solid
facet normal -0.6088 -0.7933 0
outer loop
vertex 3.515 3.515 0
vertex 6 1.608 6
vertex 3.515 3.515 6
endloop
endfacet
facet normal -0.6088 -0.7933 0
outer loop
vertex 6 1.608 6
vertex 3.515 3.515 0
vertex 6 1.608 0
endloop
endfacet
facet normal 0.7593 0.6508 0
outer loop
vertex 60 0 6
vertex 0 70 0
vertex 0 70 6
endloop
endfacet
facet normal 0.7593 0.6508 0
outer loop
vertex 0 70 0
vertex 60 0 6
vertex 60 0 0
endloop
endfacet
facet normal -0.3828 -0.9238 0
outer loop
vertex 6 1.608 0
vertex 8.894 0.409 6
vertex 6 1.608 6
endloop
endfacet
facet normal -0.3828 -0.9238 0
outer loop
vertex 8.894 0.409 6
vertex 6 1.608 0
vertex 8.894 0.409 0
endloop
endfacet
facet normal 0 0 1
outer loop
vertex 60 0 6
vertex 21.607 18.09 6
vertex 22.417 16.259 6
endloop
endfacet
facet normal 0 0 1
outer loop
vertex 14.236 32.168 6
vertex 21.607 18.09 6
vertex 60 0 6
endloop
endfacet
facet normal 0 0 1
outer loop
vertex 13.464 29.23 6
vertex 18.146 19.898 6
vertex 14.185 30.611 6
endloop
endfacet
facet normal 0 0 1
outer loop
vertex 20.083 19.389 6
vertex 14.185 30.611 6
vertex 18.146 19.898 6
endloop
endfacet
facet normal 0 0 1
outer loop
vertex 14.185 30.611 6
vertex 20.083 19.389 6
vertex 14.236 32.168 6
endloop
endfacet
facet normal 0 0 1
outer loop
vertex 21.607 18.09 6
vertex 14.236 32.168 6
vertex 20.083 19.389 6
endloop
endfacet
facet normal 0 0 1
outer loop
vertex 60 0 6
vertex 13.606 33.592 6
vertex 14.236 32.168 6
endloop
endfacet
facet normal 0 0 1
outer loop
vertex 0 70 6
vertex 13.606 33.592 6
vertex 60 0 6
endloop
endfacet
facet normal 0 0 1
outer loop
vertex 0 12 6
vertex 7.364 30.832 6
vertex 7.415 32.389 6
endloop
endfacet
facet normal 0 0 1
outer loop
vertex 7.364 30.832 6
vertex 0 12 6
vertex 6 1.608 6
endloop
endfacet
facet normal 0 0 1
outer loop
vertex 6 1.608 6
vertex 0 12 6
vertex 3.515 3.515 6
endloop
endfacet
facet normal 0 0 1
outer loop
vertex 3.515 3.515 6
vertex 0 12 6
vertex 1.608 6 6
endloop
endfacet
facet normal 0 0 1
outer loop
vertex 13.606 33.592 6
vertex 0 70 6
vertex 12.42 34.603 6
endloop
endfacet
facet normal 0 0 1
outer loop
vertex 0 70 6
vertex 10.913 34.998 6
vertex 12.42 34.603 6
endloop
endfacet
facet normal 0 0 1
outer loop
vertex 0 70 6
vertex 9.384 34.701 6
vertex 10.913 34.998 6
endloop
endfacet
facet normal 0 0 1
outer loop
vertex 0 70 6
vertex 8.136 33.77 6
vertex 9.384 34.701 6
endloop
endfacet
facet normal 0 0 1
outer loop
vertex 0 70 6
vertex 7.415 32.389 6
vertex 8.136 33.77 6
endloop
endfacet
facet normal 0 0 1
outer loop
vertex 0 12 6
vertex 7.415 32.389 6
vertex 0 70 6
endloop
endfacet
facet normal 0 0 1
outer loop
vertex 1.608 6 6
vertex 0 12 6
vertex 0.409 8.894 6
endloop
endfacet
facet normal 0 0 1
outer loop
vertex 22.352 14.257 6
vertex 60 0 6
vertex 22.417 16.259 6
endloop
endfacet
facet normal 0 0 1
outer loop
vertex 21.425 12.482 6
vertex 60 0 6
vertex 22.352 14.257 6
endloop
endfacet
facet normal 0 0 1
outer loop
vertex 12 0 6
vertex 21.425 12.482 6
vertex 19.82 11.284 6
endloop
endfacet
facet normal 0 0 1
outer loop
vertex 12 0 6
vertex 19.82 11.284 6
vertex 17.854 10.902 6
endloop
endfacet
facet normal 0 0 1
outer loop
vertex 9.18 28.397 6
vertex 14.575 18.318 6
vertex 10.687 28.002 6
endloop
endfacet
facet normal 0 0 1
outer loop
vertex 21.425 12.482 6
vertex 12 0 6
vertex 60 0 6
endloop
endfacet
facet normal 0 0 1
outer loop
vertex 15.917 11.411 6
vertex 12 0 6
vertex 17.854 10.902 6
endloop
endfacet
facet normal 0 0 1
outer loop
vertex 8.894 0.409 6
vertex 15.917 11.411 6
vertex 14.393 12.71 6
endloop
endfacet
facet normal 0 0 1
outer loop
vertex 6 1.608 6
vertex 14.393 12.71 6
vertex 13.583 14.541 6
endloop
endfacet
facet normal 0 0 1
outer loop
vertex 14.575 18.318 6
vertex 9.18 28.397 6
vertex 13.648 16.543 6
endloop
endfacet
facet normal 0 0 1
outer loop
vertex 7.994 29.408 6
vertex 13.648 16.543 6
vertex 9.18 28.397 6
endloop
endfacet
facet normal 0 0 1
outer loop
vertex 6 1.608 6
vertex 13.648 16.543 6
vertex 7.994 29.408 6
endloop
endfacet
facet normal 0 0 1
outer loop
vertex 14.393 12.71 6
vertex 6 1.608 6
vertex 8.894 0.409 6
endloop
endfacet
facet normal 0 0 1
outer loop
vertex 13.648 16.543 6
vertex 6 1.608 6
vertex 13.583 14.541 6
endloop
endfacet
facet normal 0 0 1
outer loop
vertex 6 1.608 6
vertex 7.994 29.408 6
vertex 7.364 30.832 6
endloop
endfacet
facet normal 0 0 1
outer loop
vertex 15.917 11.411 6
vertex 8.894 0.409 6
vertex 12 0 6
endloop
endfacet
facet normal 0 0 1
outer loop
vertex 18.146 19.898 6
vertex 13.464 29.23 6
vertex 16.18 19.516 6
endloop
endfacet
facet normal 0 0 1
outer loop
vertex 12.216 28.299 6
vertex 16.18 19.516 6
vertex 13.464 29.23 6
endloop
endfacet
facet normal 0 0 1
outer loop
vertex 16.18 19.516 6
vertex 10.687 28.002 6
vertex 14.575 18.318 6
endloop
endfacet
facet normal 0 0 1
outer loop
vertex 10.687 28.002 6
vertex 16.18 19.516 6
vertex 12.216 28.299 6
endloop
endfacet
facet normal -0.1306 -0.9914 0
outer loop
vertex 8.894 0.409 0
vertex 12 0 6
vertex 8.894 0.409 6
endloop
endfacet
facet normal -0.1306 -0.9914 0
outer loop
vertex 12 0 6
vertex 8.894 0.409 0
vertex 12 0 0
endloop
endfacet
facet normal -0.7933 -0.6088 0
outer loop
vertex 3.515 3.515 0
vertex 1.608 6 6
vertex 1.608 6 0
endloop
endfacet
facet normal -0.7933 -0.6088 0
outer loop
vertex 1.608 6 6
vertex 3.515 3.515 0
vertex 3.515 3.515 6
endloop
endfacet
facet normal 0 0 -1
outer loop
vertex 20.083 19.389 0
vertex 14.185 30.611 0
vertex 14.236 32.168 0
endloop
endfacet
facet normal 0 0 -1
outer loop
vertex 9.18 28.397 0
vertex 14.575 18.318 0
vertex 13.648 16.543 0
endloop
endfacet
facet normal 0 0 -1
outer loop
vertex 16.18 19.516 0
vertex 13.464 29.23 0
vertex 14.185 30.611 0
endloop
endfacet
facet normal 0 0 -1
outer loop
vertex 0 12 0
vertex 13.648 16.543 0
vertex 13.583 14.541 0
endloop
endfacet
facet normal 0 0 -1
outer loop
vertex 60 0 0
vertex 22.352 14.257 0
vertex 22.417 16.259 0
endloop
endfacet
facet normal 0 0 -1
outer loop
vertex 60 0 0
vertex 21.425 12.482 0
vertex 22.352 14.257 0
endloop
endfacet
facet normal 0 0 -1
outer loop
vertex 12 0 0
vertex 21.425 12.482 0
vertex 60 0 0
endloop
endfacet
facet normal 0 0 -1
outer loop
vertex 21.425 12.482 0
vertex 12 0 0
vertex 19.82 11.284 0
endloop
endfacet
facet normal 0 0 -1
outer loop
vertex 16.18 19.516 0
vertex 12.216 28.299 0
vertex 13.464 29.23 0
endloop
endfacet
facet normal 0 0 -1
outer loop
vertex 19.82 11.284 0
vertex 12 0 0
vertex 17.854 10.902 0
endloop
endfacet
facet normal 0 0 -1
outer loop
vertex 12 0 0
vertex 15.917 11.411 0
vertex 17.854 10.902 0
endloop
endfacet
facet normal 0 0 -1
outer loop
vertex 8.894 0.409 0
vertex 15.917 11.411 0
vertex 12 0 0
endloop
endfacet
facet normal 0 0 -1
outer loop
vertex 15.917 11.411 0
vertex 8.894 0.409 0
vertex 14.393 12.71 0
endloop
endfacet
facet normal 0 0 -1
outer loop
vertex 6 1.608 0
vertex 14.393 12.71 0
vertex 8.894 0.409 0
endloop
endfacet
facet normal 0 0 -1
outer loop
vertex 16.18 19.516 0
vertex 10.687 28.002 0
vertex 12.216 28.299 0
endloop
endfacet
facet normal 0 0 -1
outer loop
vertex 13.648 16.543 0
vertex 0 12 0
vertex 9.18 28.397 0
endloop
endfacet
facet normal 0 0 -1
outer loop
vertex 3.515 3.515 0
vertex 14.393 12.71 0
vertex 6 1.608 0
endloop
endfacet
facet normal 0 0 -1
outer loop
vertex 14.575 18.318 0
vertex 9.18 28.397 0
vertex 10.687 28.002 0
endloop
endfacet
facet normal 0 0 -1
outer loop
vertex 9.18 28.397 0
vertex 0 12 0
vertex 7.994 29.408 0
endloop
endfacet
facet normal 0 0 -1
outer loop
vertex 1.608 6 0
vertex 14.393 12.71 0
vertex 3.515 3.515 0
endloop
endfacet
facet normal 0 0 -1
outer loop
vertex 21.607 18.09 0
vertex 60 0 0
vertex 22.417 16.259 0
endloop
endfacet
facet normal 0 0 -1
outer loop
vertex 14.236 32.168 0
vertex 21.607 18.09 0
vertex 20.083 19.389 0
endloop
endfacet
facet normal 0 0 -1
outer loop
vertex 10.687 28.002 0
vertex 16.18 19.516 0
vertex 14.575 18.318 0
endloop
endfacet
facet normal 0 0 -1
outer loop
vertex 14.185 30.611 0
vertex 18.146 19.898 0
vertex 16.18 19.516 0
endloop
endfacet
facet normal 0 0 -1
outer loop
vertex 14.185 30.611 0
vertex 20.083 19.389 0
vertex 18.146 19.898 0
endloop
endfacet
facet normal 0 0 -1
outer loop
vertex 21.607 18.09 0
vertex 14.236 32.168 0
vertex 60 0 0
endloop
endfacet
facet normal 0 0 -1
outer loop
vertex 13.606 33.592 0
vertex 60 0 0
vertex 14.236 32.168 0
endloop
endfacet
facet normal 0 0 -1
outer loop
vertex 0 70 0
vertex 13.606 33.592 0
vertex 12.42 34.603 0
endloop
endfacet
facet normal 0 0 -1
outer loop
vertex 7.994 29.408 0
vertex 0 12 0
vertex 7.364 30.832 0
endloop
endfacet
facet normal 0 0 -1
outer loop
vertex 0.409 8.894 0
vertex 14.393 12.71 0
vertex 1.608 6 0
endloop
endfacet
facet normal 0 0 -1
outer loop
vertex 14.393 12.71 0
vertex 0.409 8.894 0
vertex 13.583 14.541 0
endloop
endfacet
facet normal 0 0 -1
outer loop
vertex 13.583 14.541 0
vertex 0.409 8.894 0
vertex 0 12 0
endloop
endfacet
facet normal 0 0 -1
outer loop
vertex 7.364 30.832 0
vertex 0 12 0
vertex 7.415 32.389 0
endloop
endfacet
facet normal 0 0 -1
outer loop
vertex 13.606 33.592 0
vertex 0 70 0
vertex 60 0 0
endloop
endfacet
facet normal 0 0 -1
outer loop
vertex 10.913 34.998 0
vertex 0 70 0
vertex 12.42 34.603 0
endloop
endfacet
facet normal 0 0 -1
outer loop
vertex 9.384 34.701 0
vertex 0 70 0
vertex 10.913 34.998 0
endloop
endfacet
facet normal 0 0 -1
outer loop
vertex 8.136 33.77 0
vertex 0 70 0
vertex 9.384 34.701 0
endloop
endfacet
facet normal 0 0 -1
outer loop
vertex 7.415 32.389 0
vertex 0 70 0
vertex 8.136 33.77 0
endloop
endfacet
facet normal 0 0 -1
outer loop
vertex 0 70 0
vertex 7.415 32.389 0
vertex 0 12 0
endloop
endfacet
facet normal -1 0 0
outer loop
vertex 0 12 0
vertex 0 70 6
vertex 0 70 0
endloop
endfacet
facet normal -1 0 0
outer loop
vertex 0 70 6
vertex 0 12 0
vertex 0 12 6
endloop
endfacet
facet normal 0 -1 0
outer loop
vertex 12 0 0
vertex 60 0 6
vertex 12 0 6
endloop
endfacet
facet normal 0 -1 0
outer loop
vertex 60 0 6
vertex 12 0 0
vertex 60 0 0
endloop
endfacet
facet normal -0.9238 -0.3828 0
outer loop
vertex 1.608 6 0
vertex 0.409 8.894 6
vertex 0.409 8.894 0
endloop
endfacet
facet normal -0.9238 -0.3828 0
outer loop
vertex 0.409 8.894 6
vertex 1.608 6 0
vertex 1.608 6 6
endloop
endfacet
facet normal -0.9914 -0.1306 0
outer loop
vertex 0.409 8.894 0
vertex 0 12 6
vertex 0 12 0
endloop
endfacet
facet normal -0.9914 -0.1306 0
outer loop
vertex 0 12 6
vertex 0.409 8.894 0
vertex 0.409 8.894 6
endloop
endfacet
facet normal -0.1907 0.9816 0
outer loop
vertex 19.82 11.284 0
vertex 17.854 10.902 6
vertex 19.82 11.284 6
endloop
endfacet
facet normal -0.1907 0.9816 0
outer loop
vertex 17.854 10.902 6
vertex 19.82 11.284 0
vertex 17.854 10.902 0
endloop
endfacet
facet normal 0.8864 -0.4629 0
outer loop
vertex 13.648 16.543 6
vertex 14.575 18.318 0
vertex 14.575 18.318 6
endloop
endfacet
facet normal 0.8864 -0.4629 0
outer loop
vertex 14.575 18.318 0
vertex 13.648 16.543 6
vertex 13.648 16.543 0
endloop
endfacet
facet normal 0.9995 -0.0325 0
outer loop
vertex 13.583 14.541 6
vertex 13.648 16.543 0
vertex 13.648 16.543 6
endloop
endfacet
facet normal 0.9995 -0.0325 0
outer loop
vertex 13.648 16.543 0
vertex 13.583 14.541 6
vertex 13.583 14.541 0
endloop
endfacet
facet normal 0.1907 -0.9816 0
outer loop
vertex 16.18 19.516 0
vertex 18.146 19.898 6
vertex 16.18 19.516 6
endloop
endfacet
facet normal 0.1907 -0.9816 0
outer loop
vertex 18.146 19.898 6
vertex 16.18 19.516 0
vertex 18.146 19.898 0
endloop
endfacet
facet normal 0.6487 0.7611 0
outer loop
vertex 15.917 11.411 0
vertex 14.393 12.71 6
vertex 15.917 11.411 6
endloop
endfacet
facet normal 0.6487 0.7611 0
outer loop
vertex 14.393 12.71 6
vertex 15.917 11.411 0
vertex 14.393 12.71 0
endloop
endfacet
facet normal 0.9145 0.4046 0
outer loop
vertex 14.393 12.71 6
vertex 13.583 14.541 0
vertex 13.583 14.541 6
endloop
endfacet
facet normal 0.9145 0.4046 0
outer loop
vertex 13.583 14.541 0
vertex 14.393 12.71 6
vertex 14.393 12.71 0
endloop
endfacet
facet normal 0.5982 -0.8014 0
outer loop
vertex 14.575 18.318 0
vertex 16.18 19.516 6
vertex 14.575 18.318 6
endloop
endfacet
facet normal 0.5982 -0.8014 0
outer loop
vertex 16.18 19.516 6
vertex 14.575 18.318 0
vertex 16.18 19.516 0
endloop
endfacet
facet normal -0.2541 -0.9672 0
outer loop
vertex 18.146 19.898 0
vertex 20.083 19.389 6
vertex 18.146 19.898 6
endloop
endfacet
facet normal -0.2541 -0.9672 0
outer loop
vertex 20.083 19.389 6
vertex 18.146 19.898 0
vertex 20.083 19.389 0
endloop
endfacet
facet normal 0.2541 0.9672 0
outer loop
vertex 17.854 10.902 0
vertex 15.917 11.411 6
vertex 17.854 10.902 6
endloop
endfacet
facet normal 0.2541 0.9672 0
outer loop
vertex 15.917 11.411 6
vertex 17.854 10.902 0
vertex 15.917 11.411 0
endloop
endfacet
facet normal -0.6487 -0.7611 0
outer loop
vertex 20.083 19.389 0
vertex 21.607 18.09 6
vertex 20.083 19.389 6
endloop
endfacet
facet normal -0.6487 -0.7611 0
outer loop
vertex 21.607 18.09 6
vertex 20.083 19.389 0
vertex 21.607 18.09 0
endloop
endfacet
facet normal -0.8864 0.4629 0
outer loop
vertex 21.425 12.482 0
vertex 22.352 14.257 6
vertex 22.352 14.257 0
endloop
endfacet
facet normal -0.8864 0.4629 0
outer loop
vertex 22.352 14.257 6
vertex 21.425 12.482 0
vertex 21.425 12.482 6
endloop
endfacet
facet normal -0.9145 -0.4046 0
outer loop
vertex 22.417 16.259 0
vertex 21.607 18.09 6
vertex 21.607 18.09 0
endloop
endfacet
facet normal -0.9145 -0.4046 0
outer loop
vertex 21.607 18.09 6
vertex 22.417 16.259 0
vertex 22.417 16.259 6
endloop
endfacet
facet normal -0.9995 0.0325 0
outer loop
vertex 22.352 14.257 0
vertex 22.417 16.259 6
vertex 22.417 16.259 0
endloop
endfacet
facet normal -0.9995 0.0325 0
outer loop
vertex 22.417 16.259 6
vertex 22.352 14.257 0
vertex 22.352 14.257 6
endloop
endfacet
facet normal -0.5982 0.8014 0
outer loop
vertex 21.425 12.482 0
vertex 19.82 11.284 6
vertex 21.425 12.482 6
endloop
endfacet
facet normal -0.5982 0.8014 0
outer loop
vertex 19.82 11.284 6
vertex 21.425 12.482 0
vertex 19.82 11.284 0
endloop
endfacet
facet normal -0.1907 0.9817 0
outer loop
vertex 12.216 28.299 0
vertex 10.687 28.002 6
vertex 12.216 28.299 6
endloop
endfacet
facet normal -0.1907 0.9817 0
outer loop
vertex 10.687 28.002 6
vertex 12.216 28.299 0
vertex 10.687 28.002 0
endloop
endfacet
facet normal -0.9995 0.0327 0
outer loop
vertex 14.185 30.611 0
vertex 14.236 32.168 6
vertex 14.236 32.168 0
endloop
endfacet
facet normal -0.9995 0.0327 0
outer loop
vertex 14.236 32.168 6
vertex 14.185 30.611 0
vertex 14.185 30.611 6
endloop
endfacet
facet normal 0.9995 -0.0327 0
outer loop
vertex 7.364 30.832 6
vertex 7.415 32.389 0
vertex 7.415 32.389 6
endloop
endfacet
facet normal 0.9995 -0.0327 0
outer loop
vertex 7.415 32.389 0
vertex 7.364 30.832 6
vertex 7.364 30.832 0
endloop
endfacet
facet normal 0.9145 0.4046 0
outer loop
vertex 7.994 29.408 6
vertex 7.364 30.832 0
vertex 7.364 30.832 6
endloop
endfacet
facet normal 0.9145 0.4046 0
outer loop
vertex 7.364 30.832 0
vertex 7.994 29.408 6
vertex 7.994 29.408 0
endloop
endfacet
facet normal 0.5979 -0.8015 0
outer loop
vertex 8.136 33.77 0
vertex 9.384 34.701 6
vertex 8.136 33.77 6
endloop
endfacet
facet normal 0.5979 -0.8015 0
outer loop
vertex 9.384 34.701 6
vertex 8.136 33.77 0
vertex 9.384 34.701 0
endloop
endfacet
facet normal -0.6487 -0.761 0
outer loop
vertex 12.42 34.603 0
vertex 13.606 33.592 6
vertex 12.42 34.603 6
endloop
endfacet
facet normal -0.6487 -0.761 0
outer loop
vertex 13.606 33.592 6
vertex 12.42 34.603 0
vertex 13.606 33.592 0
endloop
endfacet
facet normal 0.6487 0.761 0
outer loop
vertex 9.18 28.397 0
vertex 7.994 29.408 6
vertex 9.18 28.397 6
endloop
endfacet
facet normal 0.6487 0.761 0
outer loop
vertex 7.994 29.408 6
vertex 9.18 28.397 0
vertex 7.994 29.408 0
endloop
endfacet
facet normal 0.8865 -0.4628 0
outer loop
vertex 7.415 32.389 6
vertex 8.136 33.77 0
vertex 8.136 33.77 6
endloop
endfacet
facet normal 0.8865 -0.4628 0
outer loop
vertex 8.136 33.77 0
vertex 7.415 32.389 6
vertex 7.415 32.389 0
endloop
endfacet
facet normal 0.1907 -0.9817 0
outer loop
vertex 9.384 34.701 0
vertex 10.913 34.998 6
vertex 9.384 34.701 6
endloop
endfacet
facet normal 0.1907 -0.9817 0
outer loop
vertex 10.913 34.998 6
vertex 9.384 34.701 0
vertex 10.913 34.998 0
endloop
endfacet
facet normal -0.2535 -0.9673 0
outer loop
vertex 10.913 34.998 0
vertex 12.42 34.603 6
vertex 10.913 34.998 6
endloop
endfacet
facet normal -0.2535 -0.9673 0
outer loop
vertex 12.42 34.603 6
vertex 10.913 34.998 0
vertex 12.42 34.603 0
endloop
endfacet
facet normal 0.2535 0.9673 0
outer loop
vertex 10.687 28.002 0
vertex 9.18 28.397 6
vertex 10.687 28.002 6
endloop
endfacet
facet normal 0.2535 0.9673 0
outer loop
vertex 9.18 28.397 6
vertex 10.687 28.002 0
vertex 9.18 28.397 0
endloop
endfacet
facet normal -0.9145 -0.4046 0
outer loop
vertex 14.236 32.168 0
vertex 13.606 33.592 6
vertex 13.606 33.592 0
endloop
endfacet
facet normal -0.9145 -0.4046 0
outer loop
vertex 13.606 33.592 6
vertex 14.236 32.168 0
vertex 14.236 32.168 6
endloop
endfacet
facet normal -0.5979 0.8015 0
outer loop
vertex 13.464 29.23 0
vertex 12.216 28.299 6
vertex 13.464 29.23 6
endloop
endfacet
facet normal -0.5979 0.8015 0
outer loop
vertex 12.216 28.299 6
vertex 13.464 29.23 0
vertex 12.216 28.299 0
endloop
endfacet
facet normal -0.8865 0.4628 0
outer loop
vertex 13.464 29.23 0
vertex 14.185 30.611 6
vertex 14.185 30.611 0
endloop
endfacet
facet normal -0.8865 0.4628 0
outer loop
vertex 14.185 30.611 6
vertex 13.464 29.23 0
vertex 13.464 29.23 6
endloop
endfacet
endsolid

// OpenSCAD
$fn = 32;

// ----------------------------------------------------------------------
// Bracket plate: corner pad 60 x 70, fillet R12
// ----------------------------------------------------------------------

// --- parameters (mm) ---
hole_r = 3.5;             // bolt hole radius
plate_t = 6;              // plate thickness, Z (extrusion height)
leg_a = 60;               // base leg
leg_b = 70;               // height leg
fillet_r = 12;            // right-angle fillet radius

hole_d1 = 2 * hole_r + 2;
hole_d2 = 2 * hole_r;

profile = [[12, 0], [60, 0], [0, 70], [0, 12], [0.409, 8.894], [1.608, 6], [3.515, 3.515], [6, 1.608], [8.894, 0.409]];  // primary outline, 9 points, counter clockwise
void_1 = [[22.417, 16.259], [21.607, 18.09], [20.083, 19.389], [18.146, 19.898], [16.18, 19.516], [14.575, 18.318], [13.648, 16.543], [13.583, 14.541], [14.393, 12.71], [15.917, 11.411], [17.854, 10.902], [19.82, 11.284], [21.425, 12.482], [22.352, 14.257]];  // mount hole 1, 14 points
void_2 = [[14.236, 32.168], [13.606, 33.592], [12.42, 34.603], [10.913, 34.998], [9.384, 34.701], [8.136, 33.77], [7.415, 32.389], [7.364, 30.832], [7.994, 29.408], [9.18, 28.397], [10.687, 28.002], [12.216, 28.299], [13.464, 29.23], [14.185, 30.611]];  // mount hole 2, 14 points

// --- the one profile operation ---
difference() {
  linear_extrude(height = plate_t) polygon(points = profile);
  translate([0, 0, -1])
    linear_extrude(height = plate_t + 2) polygon(points = void_1);
  translate([0, 0, -1])
    linear_extrude(height = plate_t + 2) polygon(points = void_2);
}
